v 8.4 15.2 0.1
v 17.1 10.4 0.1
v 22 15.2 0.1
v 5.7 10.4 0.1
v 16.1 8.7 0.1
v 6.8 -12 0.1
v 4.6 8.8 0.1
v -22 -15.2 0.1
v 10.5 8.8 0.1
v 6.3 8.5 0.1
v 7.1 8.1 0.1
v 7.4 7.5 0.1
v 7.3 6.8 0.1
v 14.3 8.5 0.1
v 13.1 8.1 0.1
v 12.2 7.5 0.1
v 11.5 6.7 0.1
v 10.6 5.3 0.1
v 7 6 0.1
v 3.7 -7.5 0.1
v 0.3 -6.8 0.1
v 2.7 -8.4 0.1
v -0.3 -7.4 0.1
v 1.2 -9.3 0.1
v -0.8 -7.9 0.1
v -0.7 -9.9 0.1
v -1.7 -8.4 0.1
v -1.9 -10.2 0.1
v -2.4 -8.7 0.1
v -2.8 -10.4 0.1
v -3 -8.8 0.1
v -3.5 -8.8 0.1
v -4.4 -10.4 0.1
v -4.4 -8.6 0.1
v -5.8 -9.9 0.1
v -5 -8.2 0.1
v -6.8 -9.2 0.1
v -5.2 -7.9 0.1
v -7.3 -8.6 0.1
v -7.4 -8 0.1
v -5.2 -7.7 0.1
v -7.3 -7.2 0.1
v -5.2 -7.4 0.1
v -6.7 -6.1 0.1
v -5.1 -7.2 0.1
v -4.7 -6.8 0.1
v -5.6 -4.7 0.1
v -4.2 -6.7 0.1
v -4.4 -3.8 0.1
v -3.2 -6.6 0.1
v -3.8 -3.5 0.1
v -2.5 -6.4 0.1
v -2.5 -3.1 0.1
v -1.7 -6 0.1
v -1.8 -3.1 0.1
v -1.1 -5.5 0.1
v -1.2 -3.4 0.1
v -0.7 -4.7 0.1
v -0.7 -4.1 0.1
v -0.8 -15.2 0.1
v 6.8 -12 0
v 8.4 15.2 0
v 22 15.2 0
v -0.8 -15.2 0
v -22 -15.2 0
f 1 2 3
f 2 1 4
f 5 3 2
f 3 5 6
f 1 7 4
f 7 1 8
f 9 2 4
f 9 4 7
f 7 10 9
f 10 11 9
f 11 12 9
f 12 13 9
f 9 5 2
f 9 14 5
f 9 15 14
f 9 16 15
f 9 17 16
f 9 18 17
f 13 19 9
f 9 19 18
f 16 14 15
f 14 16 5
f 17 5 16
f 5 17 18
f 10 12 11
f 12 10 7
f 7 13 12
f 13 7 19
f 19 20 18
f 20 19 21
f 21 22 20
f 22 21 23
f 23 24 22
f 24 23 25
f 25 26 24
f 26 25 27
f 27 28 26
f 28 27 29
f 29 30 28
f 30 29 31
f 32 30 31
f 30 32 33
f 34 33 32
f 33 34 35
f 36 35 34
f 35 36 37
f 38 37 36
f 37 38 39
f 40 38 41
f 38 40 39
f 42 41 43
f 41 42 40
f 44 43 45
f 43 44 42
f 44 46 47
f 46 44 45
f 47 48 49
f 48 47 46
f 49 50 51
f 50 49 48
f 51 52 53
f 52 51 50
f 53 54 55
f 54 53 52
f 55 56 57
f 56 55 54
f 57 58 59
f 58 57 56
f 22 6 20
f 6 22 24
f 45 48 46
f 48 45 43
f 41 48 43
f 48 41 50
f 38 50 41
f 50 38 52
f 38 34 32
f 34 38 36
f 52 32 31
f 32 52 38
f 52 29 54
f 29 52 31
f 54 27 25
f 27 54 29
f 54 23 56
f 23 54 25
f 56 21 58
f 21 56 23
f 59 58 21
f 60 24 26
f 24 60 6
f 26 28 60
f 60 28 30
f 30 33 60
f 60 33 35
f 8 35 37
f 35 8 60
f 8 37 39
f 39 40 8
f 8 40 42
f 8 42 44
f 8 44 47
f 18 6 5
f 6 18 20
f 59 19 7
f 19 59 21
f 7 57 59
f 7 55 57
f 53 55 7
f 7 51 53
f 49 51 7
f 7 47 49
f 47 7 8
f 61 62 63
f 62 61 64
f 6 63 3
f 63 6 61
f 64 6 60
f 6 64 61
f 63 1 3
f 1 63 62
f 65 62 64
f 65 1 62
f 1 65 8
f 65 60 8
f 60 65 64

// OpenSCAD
use <../lib.scad>
function ldraw_lib__4297014c() = [
// 0 Sticker Tail Left with Red "J" on White
// 0 Name: 4297014c.dat
// 0 Author: Michael Heidemann [mikeheide]
// 0 !LDRAW_ORG Part UPDATE 2016-01
// 0 !LICENSE Licensed under CC BY 2.0 and CC BY 4.0 : see CAreadme.txt
// 
// 0 BFC CERTIFY CCW
  [0,"BFC","CERTIFY"],
  [0,"BFC","CCW"],
// 
// 0 !KEYWORDS Batman, Joker
// 
// 0 !HISTORY 2011-12-29 [PTadmin] Official Update 2011-02
// 0 !HISTORY 2016-07-01 [cwdee] Updated description
// 0 !HISTORY 2016-12-31 [PTadmin] Official Update 2016-01
// 
// 
// 4 15 21 -0.25 38 14.25 -0.25 26 42.75 -0.25 26 55 -0.25 38
  [4,15,21,-0.25,38,14.25,-0.25,26,42.75,-0.25,26,55,-0.25,38],
// 4 15 55 -0.25 38 42.75 -0.25 26 40.25 -0.25 21.75 17 -0.25 -30
  [4,15,55,-0.25,38,42.75,-0.25,26,40.25,-0.25,21.75,17,-0.25,-30],
// 4 15 11.5 -0.25 22 14.25 -0.25 26 21 -0.25 38 -55 -0.25 -38
  [4,15,11.5,-0.25,22,14.25,-0.25,26,21,-0.25,38,-55,-0.25,-38],
// 3 4 26.25 -0.25 22 42.75 -0.25 26 14.25 -0.25 26
  [3,4,26.25,-0.25,22,42.75,-0.25,26,14.25,-0.25,26],
// 3 4 26.25 -0.25 22 14.25 -0.25 26 11.5 -0.25 22
  [3,4,26.25,-0.25,22,14.25,-0.25,26,11.5,-0.25,22],
// 3 4 11.5 -0.25 22 15.75 -0.25 21.25 26.25 -0.25 22
  [3,4,11.5,-0.25,22,15.75,-0.25,21.25,26.25,-0.25,22],
// 3 4 15.75 -0.25 21.25 17.75 -0.25 20.25 26.25 -0.25 22
  [3,4,15.75,-0.25,21.25,17.75,-0.25,20.25,26.25,-0.25,22],
// 3 4 17.75 -0.25 20.25 18.5 -0.25 18.75 26.25 -0.25 22
  [3,4,17.75,-0.25,20.25,18.5,-0.25,18.75,26.25,-0.25,22],
// 3 4 18.5 -0.25 18.75 18.25 -0.25 17 26.25 -0.25 22
  [3,4,18.5,-0.25,18.75,18.25,-0.25,17,26.25,-0.25,22],
// 3 4 26.25 -0.25 22 40.25 -0.25 21.75 42.75 -0.25 26
  [3,4,26.25,-0.25,22,40.25,-0.25,21.75,42.75,-0.25,26],
// 3 4 26.25 -0.25 22 35.75 -0.25 21.25 40.25 -0.25 21.75
  [3,4,26.25,-0.25,22,35.75,-0.25,21.25,40.25,-0.25,21.75],
// 3 4 26.25 -0.25 22 32.75 -0.25 20.25 35.75 -0.25 21.25
  [3,4,26.25,-0.25,22,32.75,-0.25,20.25,35.75,-0.25,21.25],
// 3 4 26.25 -0.25 22 30.5 -0.25 18.75 32.75 -0.25 20.25
  [3,4,26.25,-0.25,22,30.5,-0.25,18.75,32.75,-0.25,20.25],
// 3 4 26.25 -0.25 22 28.75 -0.25 16.75 30.5 -0.25 18.75
  [3,4,26.25,-0.25,22,28.75,-0.25,16.75,30.5,-0.25,18.75],
// 3 4 26.25 -0.25 22 26.5 -0.25 13.25 28.75 -0.25 16.75
  [3,4,26.25,-0.25,22,26.5,-0.25,13.25,28.75,-0.25,16.75],
// 3 4 18.25 -0.25 17 17.5 -0.25 15 26.25 -0.25 22
  [3,4,18.25,-0.25,17,17.5,-0.25,15,26.25,-0.25,22],
// 3 4 26.25 -0.25 22 17.5 -0.25 15 26.5 -0.25 13.25
  [3,4,26.25,-0.25,22,17.5,-0.25,15,26.5,-0.25,13.25],
// 4 15 40.25 -0.25 21.75 35.75 -0.25 21.25 32.75 -0.25 20.25 30.5 -0.25 18.75
  [4,15,40.25,-0.25,21.75,35.75,-0.25,21.25,32.75,-0.25,20.25,30.5,-0.25,18.75],
// 4 15 40.25 -0.25 21.75 30.5 -0.25 18.75 28.75 -0.25 16.75 26.5 -0.25 13.25
  [4,15,40.25,-0.25,21.75,30.5,-0.25,18.75,28.75,-0.25,16.75,26.5,-0.25,13.25],
// 4 15 17.75 -0.25 20.25 15.75 -0.25 21.25 11.5 -0.25 22 18.5 -0.25 18.75
  [4,15,17.75,-0.25,20.25,15.75,-0.25,21.25,11.5,-0.25,22,18.5,-0.25,18.75],
// 4 15 18.25 -0.25 17 18.5 -0.25 18.75 11.5 -0.25 22 17.5 -0.25 15
  [4,15,18.25,-0.25,17,18.5,-0.25,18.75,11.5,-0.25,22,17.5,-0.25,15],
// 4 4 9.25 -0.25 -18.75 26.5 -0.25 13.25 17.5 -0.25 15 0.75 -0.25 -17
  [4,4,9.25,-0.25,-18.75,26.5,-0.25,13.25,17.5,-0.25,15,0.75,-0.25,-17],
// 4 4 0.75 -0.25 -17 -0.75 -0.25 -18.5 6.75 -0.25 -21 9.25 -0.25 -18.75
  [4,4,0.75,-0.25,-17,-0.75,-0.25,-18.5,6.75,-0.25,-21,9.25,-0.25,-18.75],
// 4 4 -2 -0.25 -19.75 3 -0.25 -23.25 6.75 -0.25 -21 -0.75 -0.25 -18.5
  [4,4,-2,-0.25,-19.75,3,-0.25,-23.25,6.75,-0.25,-21,-0.75,-0.25,-18.5],
// 4 4 -4.25 -0.25 -21 -1.75 -0.25 -24.75 3 -0.25 -23.25 -2 -0.25 -19.75
  [4,4,-4.25,-0.25,-21,-1.75,-0.25,-24.75,3,-0.25,-23.25,-2,-0.25,-19.75],
// 4 4 -6 -0.25 -21.75 -4.75 -0.25 -25.5 -1.75 -0.25 -24.75 -4.25 -0.25 -21
  [4,4,-6,-0.25,-21.75,-4.75,-0.25,-25.5,-1.75,-0.25,-24.75,-4.25,-0.25,-21],
// 4 4 -7.5 -0.25 -22 -7 -0.25 -26 -4.75 -0.25 -25.5 -6 -0.25 -21.75
  [4,4,-7.5,-0.25,-22,-7,-0.25,-26,-4.75,-0.25,-25.5,-6,-0.25,-21.75],
// 4 4 -8.75 -0.25 -22 -11 -0.25 -26 -7 -0.25 -26 -7.5 -0.25 -22
  [4,4,-8.75,-0.25,-22,-11,-0.25,-26,-7,-0.25,-26,-7.5,-0.25,-22],
// 4 4 -8.75 -0.25 -22 -11 -0.25 -21.5 -14.5 -0.25 -24.75 -11 -0.25 -26
  [4,4,-8.75,-0.25,-22,-11,-0.25,-21.5,-14.5,-0.25,-24.75,-11,-0.25,-26],
// 4 4 -11 -0.25 -21.5 -12.5 -0.25 -20.5 -17 -0.25 -23 -14.5 -0.25 -24.75
  [4,4,-11,-0.25,-21.5,-12.5,-0.25,-20.5,-17,-0.25,-23,-14.5,-0.25,-24.75],
// 4 4 -13 -0.25 -19.75 -18.25 -0.25 -21.5 -17 -0.25 -23 -12.5 -0.25 -20.5
  [4,4,-13,-0.25,-19.75,-18.25,-0.25,-21.5,-17,-0.25,-23,-12.5,-0.25,-20.5],
// 4 4 -13 -0.25 -19.25 -18.5 -0.25 -20 -18.25 -0.25 -21.5 -13 -0.25 -19.75
  [4,4,-13,-0.25,-19.25,-18.5,-0.25,-20,-18.25,-0.25,-21.5,-13,-0.25,-19.75],
// 4 4 -13 -0.25 -18.5 -18.25 -0.25 -18 -18.5 -0.25 -20 -13 -0.25 -19.25
  [4,4,-13,-0.25,-18.5,-18.25,-0.25,-18,-18.5,-0.25,-20,-13,-0.25,-19.25],
// 4 4 -12.75 -0.25 -18 -16.75 -0.25 -15.25 -18.25 -0.25 -18 -13 -0.25 -18.5
  [4,4,-12.75,-0.25,-18,-16.75,-0.25,-15.25,-18.25,-0.25,-18,-13,-0.25,-18.5],
// 4 4 -11.75 -0.25 -17 -14 -0.25 -11.75 -16.75 -0.25 -15.25 -12.75 -0.25 -18
  [4,4,-11.75,-0.25,-17,-14,-0.25,-11.75,-16.75,-0.25,-15.25,-12.75,-0.25,-18],
// 4 4 -10.5 -0.25 -16.75 -11 -0.25 -9.5 -14 -0.25 -11.75 -11.75 -0.25 -17
  [4,4,-10.5,-0.25,-16.75,-11,-0.25,-9.5,-14,-0.25,-11.75,-11.75,-0.25,-17],
// 4 4 -10.5 -0.25 -16.75 -8 -0.25 -16.5 -9.5 -0.25 -8.75 -11 -0.25 -9.5
  [4,4,-10.5,-0.25,-16.75,-8,-0.25,-16.5,-9.5,-0.25,-8.75,-11,-0.25,-9.5],
// 4 4 -6.25 -0.25 -16 -6.25 -0.25 -7.75 -9.5 -0.25 -8.75 -8 -0.25 -16.5
  [4,4,-6.25,-0.25,-16,-6.25,-0.25,-7.75,-9.5,-0.25,-8.75,-8,-0.25,-16.5],
// 4 4 -6.25 -0.25 -16 -4.25 -0.25 -15 -4.5 -0.25 -7.75 -6.25 -0.25 -7.75
  [4,4,-6.25,-0.25,-16,-4.25,-0.25,-15,-4.5,-0.25,-7.75,-6.25,-0.25,-7.75],
// 4 4 -2.75 -0.25 -13.75 -3 -0.25 -8.5 -4.5 -0.25 -7.75 -4.25 -0.25 -15
  [4,4,-2.75,-0.25,-13.75,-3,-0.25,-8.5,-4.5,-0.25,-7.75,-4.25,-0.25,-15],
// 4 4 -2.75 -0.25 -13.75 -1.75 -0.25 -11.75 -1.75 -0.25 -10.25 -3 -0.25 -8.5
  [4,4,-2.75,-0.25,-13.75,-1.75,-0.25,-11.75,-1.75,-0.25,-10.25,-3,-0.25,-8.5],
// 3 15 6.75 -0.25 -21 17 -0.25 -30 9.25 -0.25 -18.75
  [3,15,6.75,-0.25,-21,17,-0.25,-30,9.25,-0.25,-18.75],
// 3 15 17 -0.25 -30 6.75 -0.25 -21 3 -0.25 -23.25
  [3,15,17,-0.25,-30,6.75,-0.25,-21,3,-0.25,-23.25],
// 4 15 -10.5 -0.25 -16.75 -11.75 -0.25 -17 -12.75 -0.25 -18 -13 -0.25 -18.5
  [4,15,-10.5,-0.25,-16.75,-11.75,-0.25,-17,-12.75,-0.25,-18,-13,-0.25,-18.5],
// 4 15 -13 -0.25 -18.5 -13 -0.25 -19.25 -8 -0.25 -16.5 -10.5 -0.25 -16.75
  [4,15,-13,-0.25,-18.5,-13,-0.25,-19.25,-8,-0.25,-16.5,-10.5,-0.25,-16.75],
// 4 15 -13 -0.25 -19.25 -13 -0.25 -19.75 -6.25 -0.25 -16 -8 -0.25 -16.5
  [4,15,-13,-0.25,-19.25,-13,-0.25,-19.75,-6.25,-0.25,-16,-8,-0.25,-16.5],
// 4 15 -13 -0.25 -19.75 -12.5 -0.25 -20.5 -11 -0.25 -21.5 -8.75 -0.25 -22
  [4,15,-13,-0.25,-19.75,-12.5,-0.25,-20.5,-11,-0.25,-21.5,-8.75,-0.25,-22],
// 4 15 -13 -0.25 -19.75 -8.75 -0.25 -22 -7.5 -0.25 -22 -6.25 -0.25 -16
  [4,15,-13,-0.25,-19.75,-8.75,-0.25,-22,-7.5,-0.25,-22,-6.25,-0.25,-16],
// 4 15 -6 -0.25 -21.75 -4.25 -0.25 -15 -6.25 -0.25 -16 -7.5 -0.25 -22
  [4,15,-6,-0.25,-21.75,-4.25,-0.25,-15,-6.25,-0.25,-16,-7.5,-0.25,-22],
// 4 15 -4.25 -0.25 -15 -6 -0.25 -21.75 -4.25 -0.25 -21 -2 -0.25 -19.75
  [4,15,-4.25,-0.25,-15,-6,-0.25,-21.75,-4.25,-0.25,-21,-2,-0.25,-19.75],
// 4 15 -0.75 -0.25 -18.5 -2.75 -0.25 -13.75 -4.25 -0.25 -15 -2 -0.25 -19.75
  [4,15,-0.75,-0.25,-18.5,-2.75,-0.25,-13.75,-4.25,-0.25,-15,-2,-0.25,-19.75],
// 4 15 0.75 -0.25 -17 -1.75 -0.25 -11.75 -2.75 -0.25 -13.75 -0.75 -0.25 -18.5
  [4,15,0.75,-0.25,-17,-1.75,-0.25,-11.75,-2.75,-0.25,-13.75,-0.75,-0.25,-18.5],
// 3 15 -1.75 -0.25 -10.25 -1.75 -0.25 -11.75 0.75 -0.25 -17
  [3,15,-1.75,-0.25,-10.25,-1.75,-0.25,-11.75,0.75,-0.25,-17],
// 4 15 3 -0.25 -23.25 -1.75 -0.25 -24.75 -2 -0.25 -38 17 -0.25 -30
  [4,15,3,-0.25,-23.25,-1.75,-0.25,-24.75,-2,-0.25,-38,17,-0.25,-30],
// 3 15 -1.75 -0.25 -24.75 -4.75 -0.25 -25.5 -2 -0.25 -38
  [3,15,-1.75,-0.25,-24.75,-4.75,-0.25,-25.5,-2,-0.25,-38],
// 3 15 -2 -0.25 -38 -4.75 -0.25 -25.5 -7 -0.25 -26
  [3,15,-2,-0.25,-38,-4.75,-0.25,-25.5,-7,-0.25,-26],
// 3 15 -7 -0.25 -26 -11 -0.25 -26 -2 -0.25 -38
  [3,15,-7,-0.25,-26,-11,-0.25,-26,-2,-0.25,-38],
// 3 15 -2 -0.25 -38 -11 -0.25 -26 -14.5 -0.25 -24.75
  [3,15,-2,-0.25,-38,-11,-0.25,-26,-14.5,-0.25,-24.75],
// 4 15 -14.5 -0.25 -24.75 -17 -0.25 -23 -55 -0.25 -38 -2 -0.25 -38
  [4,15,-14.5,-0.25,-24.75,-17,-0.25,-23,-55,-0.25,-38,-2,-0.25,-38],
// 3 15 -55 -0.25 -38 -17 -0.25 -23 -18.25 -0.25 -21.5
  [3,15,-55,-0.25,-38,-17,-0.25,-23,-18.25,-0.25,-21.5],
// 3 15 -18.25 -0.25 -21.5 -18.5 -0.25 -20 -55 -0.25 -38
  [3,15,-18.25,-0.25,-21.5,-18.5,-0.25,-20,-55,-0.25,-38],
// 3 15 -55 -0.25 -38 -18.5 -0.25 -20 -18.25 -0.25 -18
  [3,15,-55,-0.25,-38,-18.5,-0.25,-20,-18.25,-0.25,-18],
// 3 15 -55 -0.25 -38 -18.25 -0.25 -18 -16.75 -0.25 -15.25
  [3,15,-55,-0.25,-38,-18.25,-0.25,-18,-16.75,-0.25,-15.25],
// 3 15 -55 -0.25 -38 -16.75 -0.25 -15.25 -14 -0.25 -11.75
  [3,15,-55,-0.25,-38,-16.75,-0.25,-15.25,-14,-0.25,-11.75],
// 4 15 40.25 -0.25 21.75 26.5 -0.25 13.25 9.25 -0.25 -18.75 17 -0.25 -30
  [4,15,40.25,-0.25,21.75,26.5,-0.25,13.25,9.25,-0.25,-18.75,17,-0.25,-30],
// 4 15 11.5 -0.25 22 -1.75 -0.25 -10.25 0.75 -0.25 -17 17.5 -0.25 15
  [4,15,11.5,-0.25,22,-1.75,-0.25,-10.25,0.75,-0.25,-17,17.5,-0.25,15],
// 3 15 11.5 -0.25 22 -3 -0.25 -8.5 -1.75 -0.25 -10.25
  [3,15,11.5,-0.25,22,-3,-0.25,-8.5,-1.75,-0.25,-10.25],
// 3 15 11.5 -0.25 22 -4.5 -0.25 -7.75 -3 -0.25 -8.5
  [3,15,11.5,-0.25,22,-4.5,-0.25,-7.75,-3,-0.25,-8.5],
// 3 15 -6.25 -0.25 -7.75 -4.5 -0.25 -7.75 11.5 -0.25 22
  [3,15,-6.25,-0.25,-7.75,-4.5,-0.25,-7.75,11.5,-0.25,22],
// 3 15 11.5 -0.25 22 -9.5 -0.25 -8.75 -6.25 -0.25 -7.75
  [3,15,11.5,-0.25,22,-9.5,-0.25,-8.75,-6.25,-0.25,-7.75],
// 3 15 -11 -0.25 -9.5 -9.5 -0.25 -8.75 11.5 -0.25 22
  [3,15,-11,-0.25,-9.5,-9.5,-0.25,-8.75,11.5,-0.25,22],
// 4 15 -14 -0.25 -11.75 -11 -0.25 -9.5 11.5 -0.25 22 -55 -0.25 -38
  [4,15,-14,-0.25,-11.75,-11,-0.25,-9.5,11.5,-0.25,22,-55,-0.25,-38],
// 0
// 0 Pattern created wholly or in part by Quad2Dat
// 0 Thanks James
// 0
// 4 15 21 0 38 55 0 38 17 0 -30 -2 0 -38
  [4,15,21,0,38,55,0,38,17,0,-30,-2,0,-38],
// 4 15 17 0 -30 55 0 38 55 -0.25 38 17 -0.25 -30
  [4,15,17,0,-30,55,0,38,55,-0.25,38,17,-0.25,-30],
// 4 15 17 -0.25 -30 -2 -0.25 -38 -2 0 -38 17 0 -30
  [4,15,17,-0.25,-30,-2,-0.25,-38,-2,0,-38,17,0,-30],
// 4 15 21 -0.25 38 55 -0.25 38 55 0 38 21 0 38
  [4,15,21,-0.25,38,55,-0.25,38,55,0,38,21,0,38],
// 3 15 -55 0 -38 21 0 38 -2 0 -38
  [3,15,-55,0,-38,21,0,38,-2,0,-38],
// 4 15 -55 -0.25 -38 21 -0.25 38 21 0 38 -55 0 -38
  [4,15,-55,-0.25,-38,21,-0.25,38,21,0,38,-55,0,-38],
// 4 15 -2 -0.25 -38 -55 -0.25 -38 -55 0 -38 -2 0 -38
  [4,15,-2,-0.25,-38,-55,-0.25,-38,-55,0,-38,-2,0,-38],
// 0
];
makepoly(ldraw_lib__4297014c(), line=0.2);
